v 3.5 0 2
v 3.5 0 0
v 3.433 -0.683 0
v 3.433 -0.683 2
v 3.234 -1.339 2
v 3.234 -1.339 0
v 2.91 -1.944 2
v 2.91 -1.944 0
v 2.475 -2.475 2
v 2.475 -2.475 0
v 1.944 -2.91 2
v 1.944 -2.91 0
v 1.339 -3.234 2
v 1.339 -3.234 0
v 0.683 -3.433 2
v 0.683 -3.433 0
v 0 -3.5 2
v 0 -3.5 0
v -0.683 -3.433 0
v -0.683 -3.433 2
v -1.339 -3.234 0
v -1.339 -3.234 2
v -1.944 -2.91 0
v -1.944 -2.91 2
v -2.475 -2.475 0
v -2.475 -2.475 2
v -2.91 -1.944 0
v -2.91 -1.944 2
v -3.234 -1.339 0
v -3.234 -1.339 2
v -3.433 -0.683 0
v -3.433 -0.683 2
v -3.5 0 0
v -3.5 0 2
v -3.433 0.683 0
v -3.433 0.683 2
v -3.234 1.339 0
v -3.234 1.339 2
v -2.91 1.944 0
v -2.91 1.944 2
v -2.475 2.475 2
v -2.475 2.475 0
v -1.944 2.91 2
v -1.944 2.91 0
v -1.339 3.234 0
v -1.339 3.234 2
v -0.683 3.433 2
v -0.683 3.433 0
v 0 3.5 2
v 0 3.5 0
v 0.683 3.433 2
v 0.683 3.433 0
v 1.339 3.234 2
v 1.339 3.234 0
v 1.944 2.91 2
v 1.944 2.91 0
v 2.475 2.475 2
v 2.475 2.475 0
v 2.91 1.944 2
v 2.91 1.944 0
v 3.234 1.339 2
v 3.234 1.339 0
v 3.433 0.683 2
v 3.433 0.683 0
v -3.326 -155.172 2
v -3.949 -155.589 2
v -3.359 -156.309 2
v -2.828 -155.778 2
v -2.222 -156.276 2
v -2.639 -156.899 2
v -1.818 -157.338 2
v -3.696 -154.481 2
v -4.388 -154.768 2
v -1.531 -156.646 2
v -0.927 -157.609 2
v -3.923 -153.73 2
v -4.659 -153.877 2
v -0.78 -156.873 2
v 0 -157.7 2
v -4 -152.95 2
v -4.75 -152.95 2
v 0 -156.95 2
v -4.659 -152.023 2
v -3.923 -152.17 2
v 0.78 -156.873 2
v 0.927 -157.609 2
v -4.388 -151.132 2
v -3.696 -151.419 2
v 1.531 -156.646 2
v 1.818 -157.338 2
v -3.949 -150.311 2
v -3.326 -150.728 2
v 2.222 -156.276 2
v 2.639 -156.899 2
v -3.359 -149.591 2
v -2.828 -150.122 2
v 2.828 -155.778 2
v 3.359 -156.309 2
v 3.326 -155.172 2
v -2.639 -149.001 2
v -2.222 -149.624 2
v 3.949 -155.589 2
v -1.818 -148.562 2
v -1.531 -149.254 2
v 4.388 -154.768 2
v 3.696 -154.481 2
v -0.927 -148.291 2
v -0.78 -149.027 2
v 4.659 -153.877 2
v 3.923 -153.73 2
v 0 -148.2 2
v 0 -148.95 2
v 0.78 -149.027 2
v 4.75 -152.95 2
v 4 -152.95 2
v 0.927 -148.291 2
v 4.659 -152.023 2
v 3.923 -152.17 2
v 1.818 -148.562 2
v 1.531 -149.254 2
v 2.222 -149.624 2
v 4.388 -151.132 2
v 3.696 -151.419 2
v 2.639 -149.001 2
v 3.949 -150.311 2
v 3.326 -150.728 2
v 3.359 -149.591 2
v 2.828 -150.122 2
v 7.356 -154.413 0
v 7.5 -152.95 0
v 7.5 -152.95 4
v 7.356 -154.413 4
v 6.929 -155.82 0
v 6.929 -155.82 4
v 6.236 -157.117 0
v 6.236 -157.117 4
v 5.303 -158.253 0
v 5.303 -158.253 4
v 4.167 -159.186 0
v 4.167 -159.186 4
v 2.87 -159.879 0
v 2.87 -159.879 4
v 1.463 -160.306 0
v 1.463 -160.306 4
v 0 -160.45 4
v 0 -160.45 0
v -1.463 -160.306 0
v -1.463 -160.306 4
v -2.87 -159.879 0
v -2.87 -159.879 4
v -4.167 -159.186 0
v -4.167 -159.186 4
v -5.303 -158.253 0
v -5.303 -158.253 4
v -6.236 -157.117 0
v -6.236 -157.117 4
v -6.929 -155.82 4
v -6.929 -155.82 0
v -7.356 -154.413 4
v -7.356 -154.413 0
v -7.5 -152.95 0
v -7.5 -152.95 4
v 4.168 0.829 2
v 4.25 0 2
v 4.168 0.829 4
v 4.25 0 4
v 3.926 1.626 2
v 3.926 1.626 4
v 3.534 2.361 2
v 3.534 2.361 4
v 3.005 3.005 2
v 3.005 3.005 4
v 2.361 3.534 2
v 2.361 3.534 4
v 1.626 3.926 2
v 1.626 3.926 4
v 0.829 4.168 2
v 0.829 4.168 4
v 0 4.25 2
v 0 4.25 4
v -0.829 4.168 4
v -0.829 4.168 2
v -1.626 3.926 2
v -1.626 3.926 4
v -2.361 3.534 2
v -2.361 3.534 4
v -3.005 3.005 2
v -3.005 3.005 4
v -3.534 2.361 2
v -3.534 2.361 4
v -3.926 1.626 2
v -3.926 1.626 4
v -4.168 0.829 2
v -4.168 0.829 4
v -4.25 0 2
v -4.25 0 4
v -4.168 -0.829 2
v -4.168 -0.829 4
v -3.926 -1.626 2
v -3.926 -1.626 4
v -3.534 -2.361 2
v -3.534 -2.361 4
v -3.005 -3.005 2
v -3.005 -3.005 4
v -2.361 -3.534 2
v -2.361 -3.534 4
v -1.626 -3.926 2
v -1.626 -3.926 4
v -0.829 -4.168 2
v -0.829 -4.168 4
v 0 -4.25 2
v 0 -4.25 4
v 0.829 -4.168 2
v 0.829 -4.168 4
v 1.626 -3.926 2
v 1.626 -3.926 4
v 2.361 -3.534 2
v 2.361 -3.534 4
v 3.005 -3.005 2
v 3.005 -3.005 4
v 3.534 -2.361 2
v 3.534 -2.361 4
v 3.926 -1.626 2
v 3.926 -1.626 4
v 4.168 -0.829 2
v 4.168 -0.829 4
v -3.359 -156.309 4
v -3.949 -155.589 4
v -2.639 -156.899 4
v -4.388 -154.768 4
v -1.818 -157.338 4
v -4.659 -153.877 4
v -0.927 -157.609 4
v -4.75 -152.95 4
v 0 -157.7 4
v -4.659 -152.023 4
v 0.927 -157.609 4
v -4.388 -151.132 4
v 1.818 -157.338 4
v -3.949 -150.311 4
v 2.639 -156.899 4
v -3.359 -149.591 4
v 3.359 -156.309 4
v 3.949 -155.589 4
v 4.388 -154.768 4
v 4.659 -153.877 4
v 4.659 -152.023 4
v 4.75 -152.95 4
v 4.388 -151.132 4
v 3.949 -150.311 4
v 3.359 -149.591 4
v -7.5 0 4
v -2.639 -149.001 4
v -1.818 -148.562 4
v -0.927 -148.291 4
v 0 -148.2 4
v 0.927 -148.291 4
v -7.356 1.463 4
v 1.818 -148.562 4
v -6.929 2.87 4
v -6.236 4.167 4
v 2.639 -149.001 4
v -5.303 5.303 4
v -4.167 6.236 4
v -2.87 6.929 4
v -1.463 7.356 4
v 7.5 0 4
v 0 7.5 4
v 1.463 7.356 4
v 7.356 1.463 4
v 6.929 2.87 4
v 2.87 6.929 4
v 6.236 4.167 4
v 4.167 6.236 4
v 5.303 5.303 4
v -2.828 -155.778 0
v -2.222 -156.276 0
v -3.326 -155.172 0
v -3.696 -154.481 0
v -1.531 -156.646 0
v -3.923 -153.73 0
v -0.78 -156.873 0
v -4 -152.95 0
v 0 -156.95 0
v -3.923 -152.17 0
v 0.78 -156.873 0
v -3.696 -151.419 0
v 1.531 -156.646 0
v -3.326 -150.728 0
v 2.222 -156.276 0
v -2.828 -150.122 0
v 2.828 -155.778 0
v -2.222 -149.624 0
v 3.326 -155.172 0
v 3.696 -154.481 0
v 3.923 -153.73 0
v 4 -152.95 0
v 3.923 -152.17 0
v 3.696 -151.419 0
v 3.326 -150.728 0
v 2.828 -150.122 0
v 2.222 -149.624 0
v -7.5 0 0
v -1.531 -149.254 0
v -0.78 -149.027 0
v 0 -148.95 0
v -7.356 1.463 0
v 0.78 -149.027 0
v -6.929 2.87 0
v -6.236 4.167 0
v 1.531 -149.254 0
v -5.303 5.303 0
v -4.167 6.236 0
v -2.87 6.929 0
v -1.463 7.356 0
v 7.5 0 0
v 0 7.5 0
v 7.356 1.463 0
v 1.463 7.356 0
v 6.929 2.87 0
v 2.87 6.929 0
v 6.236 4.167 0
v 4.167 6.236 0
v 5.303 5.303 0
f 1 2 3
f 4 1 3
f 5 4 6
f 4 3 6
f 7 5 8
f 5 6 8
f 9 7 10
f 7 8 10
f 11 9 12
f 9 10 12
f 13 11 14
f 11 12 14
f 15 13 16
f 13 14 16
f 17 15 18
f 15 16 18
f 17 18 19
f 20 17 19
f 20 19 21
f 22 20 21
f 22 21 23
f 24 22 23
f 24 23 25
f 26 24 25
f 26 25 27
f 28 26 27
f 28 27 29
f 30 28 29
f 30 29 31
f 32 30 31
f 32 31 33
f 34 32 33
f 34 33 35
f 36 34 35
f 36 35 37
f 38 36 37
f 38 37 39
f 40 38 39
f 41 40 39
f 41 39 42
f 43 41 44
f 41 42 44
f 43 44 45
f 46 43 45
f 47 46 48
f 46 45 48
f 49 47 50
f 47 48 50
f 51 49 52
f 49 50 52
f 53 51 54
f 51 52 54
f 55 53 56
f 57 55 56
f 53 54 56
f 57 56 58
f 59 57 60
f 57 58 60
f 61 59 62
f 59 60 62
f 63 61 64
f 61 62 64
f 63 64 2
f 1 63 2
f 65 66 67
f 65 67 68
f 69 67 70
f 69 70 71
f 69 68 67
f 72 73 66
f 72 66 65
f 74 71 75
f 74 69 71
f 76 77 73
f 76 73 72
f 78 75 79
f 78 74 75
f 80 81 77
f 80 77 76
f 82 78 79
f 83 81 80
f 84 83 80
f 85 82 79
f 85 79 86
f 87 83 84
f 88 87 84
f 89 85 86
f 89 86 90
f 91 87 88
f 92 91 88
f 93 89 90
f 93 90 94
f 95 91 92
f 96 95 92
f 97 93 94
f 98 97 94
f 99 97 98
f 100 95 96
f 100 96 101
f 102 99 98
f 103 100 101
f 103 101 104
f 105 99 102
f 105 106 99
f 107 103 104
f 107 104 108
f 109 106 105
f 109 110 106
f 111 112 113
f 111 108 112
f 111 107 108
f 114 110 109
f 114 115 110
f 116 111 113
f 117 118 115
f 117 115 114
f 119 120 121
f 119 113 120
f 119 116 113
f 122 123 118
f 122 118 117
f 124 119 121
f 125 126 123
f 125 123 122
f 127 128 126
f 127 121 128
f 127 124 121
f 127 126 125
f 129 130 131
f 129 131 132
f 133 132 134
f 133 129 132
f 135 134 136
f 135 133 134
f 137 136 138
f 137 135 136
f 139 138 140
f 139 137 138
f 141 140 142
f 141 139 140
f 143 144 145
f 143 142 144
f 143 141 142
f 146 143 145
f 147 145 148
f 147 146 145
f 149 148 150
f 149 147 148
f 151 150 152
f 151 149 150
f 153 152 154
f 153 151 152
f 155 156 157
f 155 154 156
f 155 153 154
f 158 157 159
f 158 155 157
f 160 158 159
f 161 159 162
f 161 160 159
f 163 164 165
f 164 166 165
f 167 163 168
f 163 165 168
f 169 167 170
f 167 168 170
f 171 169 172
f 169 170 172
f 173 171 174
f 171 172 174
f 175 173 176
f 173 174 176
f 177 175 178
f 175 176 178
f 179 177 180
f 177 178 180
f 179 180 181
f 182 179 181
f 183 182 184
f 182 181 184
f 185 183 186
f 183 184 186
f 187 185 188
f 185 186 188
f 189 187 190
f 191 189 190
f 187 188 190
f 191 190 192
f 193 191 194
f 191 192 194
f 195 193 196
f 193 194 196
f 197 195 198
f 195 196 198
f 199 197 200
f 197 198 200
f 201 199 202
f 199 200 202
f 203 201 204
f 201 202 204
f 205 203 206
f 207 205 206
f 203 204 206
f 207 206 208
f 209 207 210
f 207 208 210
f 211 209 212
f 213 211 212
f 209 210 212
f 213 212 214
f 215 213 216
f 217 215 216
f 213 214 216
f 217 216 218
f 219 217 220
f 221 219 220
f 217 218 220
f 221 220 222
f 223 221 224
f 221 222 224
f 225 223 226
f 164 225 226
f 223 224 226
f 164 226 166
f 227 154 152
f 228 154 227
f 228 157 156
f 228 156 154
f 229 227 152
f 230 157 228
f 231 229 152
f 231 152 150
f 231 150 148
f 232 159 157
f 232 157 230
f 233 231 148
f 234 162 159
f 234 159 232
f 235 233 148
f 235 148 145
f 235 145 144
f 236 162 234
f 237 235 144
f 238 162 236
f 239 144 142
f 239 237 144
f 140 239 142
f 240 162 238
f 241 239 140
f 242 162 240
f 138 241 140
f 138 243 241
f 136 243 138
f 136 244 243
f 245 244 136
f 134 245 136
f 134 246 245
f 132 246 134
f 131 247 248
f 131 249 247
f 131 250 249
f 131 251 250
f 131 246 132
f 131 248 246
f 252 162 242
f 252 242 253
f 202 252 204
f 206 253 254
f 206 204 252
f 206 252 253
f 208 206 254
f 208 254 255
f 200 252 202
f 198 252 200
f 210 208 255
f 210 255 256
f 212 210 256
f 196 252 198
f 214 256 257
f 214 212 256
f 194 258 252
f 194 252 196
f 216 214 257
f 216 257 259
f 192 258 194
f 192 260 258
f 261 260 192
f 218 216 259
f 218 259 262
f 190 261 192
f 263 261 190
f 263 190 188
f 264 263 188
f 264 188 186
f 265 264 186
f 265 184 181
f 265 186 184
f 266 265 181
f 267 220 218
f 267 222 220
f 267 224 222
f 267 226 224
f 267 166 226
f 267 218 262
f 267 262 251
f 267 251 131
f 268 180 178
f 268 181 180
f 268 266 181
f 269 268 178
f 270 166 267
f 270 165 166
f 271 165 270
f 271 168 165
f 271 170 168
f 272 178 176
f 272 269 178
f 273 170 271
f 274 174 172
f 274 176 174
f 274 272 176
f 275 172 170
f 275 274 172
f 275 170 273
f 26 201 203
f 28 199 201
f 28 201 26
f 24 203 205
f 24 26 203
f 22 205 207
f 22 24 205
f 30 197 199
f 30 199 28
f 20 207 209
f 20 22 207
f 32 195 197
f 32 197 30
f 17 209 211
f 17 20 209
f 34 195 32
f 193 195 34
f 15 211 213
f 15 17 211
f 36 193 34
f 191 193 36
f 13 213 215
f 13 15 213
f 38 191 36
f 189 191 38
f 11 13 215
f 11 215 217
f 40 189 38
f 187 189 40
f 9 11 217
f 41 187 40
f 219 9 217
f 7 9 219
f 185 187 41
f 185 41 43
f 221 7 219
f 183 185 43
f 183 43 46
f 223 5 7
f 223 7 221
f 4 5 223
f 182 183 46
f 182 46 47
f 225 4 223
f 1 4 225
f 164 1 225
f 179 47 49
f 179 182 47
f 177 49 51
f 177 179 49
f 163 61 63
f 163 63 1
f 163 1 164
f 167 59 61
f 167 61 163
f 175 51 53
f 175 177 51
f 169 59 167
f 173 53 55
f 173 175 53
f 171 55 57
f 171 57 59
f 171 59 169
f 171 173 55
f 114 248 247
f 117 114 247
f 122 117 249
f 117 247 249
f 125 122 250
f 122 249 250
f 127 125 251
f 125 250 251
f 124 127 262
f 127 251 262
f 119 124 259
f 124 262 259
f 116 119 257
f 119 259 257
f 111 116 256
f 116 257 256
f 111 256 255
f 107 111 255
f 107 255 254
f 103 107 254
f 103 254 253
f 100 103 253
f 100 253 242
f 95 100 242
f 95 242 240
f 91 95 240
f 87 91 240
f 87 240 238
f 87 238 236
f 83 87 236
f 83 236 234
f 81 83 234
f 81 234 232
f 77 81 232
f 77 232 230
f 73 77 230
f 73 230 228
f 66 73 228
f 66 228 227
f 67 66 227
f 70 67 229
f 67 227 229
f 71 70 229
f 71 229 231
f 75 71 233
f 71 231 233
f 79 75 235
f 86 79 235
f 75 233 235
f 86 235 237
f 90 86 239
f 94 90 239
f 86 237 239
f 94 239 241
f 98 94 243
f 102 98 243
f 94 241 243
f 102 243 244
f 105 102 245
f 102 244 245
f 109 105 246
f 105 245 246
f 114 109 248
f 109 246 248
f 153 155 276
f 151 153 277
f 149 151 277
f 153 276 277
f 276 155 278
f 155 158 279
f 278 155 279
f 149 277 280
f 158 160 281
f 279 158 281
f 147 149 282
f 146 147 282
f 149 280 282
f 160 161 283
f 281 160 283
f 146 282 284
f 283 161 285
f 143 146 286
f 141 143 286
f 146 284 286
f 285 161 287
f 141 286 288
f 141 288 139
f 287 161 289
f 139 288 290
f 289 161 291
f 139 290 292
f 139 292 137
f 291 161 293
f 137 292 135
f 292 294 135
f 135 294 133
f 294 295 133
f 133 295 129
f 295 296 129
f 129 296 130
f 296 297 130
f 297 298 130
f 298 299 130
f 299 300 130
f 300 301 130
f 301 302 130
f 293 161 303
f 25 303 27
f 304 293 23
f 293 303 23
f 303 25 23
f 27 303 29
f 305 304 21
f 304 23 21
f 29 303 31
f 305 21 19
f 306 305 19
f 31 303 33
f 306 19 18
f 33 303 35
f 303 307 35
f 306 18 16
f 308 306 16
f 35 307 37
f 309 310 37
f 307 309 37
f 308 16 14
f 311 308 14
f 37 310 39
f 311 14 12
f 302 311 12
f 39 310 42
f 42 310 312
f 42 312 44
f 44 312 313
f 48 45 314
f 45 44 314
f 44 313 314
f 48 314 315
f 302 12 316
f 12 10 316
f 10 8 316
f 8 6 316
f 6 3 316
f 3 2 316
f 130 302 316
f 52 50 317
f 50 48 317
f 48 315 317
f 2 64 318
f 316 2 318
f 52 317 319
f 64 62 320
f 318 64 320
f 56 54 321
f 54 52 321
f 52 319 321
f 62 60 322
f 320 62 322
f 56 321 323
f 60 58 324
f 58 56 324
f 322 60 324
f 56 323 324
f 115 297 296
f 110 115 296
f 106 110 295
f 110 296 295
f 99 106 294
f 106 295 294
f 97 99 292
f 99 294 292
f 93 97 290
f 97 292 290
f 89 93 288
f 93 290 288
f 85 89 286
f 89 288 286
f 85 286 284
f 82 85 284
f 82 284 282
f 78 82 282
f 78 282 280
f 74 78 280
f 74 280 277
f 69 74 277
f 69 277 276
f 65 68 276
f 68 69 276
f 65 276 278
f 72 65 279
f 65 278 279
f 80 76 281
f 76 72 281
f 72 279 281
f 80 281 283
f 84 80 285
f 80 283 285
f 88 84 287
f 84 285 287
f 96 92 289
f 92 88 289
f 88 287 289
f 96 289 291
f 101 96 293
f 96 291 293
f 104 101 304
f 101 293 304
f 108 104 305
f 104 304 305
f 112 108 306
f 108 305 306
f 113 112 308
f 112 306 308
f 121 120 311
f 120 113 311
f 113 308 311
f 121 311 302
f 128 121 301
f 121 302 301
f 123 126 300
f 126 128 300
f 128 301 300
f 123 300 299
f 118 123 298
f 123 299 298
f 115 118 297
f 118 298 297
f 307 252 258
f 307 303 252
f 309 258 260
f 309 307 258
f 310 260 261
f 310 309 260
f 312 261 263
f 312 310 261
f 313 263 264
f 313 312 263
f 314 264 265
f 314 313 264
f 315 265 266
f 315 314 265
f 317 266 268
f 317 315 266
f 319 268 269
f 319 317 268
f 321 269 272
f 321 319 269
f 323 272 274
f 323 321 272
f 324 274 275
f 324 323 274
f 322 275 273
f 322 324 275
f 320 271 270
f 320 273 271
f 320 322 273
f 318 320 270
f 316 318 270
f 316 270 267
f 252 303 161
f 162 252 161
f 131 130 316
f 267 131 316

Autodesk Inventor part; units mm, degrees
ref_plane "YZ Plane" through (0, 0, 0) normal (1, 0, 0) x (0, 1, 0)
ref_plane "XZ Plane" through (0, 0, 0) normal (0, 1, 0) x (-1, 0, 0)
ref_plane "XY Plane" through (0, 0, 0) normal (0, 0, 1) x (1, 0, 0)
sketch "スケッチ1" plane through (0, 0, 0) normal (0, 1, 0) x (-1, 0, 0)
  point P0 (0, 0)
sketch "スケッチ2" plane through (0, 0, 0) normal (0, 0, 1) x (1, 0, 0)
  circle A0 centre (0, 0) radius 3.5
  circle A1 centre (0, 0) radius 7.5
  line L0 (0, 0) -> (0, -152.95)
  circle A2 centre (0, -152.95) radius 4
  circle A3 centre (0, -152.95) radius 7.5
  line L1 (7.5, -152.95) -> (7.5, 0)
  line L2 (-7.5, 0) -> (-7.5, -152.95)
  dimension "d0" = 7
  dimension "d1" = 15
  dimension "d2" = 152.95
  dimension "d3" = 8
  dimension "d4" = 15
extrude "押し出し1" add sketch "スケッチ2" along normal blind 4
sketch "スケッチ4" plane through (0, 0, 4) normal (0, 0, 1) x (1, 0, 0)
  arc A0 (7.5, 0) -> (-7.5, 0) centre (0, 0) ccw projected
  circle A1 centre (0, 0) radius 4.25
  circle A2 centre (0, -152.95) radius 4 projected
  circle A3 centre (0, -152.95) radius 4.75
  dimension "d10" = 8.5
  dimension "d11" = 9.5
extrude "押し出し3" cut sketch "スケッチ4" against normal blind 2
properties part number "motor_holder_top"
